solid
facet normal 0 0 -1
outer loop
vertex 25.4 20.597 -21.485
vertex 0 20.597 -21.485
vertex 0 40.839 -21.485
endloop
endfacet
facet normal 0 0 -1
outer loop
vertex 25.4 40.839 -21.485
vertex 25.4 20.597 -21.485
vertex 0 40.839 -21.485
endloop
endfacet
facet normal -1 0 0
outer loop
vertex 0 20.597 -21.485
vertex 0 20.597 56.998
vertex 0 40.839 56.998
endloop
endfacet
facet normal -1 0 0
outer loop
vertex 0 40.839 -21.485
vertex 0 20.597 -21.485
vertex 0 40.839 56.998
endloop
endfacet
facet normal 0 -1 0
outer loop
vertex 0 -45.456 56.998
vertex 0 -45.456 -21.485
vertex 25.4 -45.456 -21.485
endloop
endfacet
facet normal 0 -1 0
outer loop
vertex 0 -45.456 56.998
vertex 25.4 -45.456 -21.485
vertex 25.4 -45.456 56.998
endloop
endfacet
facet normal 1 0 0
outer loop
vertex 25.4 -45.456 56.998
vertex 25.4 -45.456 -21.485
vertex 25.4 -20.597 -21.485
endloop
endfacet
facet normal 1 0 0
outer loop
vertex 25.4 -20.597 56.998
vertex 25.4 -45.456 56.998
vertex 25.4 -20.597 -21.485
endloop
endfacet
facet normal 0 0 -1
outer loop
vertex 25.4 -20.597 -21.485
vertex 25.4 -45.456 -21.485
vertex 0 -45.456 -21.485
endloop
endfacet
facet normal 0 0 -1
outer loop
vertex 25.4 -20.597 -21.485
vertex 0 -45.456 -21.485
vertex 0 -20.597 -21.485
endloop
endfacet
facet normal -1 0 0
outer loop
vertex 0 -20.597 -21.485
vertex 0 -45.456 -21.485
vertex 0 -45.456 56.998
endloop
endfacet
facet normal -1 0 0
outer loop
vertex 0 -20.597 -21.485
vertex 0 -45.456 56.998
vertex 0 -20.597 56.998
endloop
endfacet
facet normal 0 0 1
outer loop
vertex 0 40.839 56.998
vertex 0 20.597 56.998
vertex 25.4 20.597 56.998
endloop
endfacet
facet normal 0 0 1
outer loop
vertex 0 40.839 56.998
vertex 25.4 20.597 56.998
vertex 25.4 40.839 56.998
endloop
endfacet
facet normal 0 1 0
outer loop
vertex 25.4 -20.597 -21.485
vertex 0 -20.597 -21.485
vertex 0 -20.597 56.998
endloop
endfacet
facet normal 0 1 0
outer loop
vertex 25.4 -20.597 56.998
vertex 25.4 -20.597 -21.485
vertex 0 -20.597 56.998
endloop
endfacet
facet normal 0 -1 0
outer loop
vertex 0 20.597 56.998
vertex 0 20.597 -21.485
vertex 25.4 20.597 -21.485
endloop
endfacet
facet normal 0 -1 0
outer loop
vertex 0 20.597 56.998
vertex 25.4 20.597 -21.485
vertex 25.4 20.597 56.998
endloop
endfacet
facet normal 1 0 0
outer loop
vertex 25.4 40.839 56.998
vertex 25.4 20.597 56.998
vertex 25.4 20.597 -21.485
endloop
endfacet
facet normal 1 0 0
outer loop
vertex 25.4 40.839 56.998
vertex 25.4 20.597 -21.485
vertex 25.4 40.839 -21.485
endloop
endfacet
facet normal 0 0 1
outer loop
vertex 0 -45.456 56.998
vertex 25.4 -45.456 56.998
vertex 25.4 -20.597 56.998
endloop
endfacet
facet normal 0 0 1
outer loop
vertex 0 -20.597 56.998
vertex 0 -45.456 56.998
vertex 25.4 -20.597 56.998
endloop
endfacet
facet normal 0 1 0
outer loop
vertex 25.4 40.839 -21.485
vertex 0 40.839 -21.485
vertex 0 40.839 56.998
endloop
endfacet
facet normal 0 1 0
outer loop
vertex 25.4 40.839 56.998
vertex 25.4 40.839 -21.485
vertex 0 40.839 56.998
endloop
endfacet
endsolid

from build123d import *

# Parameters (mm, degrees)
F0_W     = 24.858734
F0_H     = 78.482572
F0_W_2   = 20.242112
F1_DEPTH = 25.4


with BuildPart() as f1:
    # F0 (on Right) → F1 (new body)
    with BuildSketch(Plane.YZ):
        with Locations((-33.026603, 17.75624)):
            Rectangle(F0_W, F0_H)
        with Locations((30.718292, 17.75624)):
            Rectangle(F0_W_2, F0_H)
    extrude(amount=F1_DEPTH)


solid = f1.part
